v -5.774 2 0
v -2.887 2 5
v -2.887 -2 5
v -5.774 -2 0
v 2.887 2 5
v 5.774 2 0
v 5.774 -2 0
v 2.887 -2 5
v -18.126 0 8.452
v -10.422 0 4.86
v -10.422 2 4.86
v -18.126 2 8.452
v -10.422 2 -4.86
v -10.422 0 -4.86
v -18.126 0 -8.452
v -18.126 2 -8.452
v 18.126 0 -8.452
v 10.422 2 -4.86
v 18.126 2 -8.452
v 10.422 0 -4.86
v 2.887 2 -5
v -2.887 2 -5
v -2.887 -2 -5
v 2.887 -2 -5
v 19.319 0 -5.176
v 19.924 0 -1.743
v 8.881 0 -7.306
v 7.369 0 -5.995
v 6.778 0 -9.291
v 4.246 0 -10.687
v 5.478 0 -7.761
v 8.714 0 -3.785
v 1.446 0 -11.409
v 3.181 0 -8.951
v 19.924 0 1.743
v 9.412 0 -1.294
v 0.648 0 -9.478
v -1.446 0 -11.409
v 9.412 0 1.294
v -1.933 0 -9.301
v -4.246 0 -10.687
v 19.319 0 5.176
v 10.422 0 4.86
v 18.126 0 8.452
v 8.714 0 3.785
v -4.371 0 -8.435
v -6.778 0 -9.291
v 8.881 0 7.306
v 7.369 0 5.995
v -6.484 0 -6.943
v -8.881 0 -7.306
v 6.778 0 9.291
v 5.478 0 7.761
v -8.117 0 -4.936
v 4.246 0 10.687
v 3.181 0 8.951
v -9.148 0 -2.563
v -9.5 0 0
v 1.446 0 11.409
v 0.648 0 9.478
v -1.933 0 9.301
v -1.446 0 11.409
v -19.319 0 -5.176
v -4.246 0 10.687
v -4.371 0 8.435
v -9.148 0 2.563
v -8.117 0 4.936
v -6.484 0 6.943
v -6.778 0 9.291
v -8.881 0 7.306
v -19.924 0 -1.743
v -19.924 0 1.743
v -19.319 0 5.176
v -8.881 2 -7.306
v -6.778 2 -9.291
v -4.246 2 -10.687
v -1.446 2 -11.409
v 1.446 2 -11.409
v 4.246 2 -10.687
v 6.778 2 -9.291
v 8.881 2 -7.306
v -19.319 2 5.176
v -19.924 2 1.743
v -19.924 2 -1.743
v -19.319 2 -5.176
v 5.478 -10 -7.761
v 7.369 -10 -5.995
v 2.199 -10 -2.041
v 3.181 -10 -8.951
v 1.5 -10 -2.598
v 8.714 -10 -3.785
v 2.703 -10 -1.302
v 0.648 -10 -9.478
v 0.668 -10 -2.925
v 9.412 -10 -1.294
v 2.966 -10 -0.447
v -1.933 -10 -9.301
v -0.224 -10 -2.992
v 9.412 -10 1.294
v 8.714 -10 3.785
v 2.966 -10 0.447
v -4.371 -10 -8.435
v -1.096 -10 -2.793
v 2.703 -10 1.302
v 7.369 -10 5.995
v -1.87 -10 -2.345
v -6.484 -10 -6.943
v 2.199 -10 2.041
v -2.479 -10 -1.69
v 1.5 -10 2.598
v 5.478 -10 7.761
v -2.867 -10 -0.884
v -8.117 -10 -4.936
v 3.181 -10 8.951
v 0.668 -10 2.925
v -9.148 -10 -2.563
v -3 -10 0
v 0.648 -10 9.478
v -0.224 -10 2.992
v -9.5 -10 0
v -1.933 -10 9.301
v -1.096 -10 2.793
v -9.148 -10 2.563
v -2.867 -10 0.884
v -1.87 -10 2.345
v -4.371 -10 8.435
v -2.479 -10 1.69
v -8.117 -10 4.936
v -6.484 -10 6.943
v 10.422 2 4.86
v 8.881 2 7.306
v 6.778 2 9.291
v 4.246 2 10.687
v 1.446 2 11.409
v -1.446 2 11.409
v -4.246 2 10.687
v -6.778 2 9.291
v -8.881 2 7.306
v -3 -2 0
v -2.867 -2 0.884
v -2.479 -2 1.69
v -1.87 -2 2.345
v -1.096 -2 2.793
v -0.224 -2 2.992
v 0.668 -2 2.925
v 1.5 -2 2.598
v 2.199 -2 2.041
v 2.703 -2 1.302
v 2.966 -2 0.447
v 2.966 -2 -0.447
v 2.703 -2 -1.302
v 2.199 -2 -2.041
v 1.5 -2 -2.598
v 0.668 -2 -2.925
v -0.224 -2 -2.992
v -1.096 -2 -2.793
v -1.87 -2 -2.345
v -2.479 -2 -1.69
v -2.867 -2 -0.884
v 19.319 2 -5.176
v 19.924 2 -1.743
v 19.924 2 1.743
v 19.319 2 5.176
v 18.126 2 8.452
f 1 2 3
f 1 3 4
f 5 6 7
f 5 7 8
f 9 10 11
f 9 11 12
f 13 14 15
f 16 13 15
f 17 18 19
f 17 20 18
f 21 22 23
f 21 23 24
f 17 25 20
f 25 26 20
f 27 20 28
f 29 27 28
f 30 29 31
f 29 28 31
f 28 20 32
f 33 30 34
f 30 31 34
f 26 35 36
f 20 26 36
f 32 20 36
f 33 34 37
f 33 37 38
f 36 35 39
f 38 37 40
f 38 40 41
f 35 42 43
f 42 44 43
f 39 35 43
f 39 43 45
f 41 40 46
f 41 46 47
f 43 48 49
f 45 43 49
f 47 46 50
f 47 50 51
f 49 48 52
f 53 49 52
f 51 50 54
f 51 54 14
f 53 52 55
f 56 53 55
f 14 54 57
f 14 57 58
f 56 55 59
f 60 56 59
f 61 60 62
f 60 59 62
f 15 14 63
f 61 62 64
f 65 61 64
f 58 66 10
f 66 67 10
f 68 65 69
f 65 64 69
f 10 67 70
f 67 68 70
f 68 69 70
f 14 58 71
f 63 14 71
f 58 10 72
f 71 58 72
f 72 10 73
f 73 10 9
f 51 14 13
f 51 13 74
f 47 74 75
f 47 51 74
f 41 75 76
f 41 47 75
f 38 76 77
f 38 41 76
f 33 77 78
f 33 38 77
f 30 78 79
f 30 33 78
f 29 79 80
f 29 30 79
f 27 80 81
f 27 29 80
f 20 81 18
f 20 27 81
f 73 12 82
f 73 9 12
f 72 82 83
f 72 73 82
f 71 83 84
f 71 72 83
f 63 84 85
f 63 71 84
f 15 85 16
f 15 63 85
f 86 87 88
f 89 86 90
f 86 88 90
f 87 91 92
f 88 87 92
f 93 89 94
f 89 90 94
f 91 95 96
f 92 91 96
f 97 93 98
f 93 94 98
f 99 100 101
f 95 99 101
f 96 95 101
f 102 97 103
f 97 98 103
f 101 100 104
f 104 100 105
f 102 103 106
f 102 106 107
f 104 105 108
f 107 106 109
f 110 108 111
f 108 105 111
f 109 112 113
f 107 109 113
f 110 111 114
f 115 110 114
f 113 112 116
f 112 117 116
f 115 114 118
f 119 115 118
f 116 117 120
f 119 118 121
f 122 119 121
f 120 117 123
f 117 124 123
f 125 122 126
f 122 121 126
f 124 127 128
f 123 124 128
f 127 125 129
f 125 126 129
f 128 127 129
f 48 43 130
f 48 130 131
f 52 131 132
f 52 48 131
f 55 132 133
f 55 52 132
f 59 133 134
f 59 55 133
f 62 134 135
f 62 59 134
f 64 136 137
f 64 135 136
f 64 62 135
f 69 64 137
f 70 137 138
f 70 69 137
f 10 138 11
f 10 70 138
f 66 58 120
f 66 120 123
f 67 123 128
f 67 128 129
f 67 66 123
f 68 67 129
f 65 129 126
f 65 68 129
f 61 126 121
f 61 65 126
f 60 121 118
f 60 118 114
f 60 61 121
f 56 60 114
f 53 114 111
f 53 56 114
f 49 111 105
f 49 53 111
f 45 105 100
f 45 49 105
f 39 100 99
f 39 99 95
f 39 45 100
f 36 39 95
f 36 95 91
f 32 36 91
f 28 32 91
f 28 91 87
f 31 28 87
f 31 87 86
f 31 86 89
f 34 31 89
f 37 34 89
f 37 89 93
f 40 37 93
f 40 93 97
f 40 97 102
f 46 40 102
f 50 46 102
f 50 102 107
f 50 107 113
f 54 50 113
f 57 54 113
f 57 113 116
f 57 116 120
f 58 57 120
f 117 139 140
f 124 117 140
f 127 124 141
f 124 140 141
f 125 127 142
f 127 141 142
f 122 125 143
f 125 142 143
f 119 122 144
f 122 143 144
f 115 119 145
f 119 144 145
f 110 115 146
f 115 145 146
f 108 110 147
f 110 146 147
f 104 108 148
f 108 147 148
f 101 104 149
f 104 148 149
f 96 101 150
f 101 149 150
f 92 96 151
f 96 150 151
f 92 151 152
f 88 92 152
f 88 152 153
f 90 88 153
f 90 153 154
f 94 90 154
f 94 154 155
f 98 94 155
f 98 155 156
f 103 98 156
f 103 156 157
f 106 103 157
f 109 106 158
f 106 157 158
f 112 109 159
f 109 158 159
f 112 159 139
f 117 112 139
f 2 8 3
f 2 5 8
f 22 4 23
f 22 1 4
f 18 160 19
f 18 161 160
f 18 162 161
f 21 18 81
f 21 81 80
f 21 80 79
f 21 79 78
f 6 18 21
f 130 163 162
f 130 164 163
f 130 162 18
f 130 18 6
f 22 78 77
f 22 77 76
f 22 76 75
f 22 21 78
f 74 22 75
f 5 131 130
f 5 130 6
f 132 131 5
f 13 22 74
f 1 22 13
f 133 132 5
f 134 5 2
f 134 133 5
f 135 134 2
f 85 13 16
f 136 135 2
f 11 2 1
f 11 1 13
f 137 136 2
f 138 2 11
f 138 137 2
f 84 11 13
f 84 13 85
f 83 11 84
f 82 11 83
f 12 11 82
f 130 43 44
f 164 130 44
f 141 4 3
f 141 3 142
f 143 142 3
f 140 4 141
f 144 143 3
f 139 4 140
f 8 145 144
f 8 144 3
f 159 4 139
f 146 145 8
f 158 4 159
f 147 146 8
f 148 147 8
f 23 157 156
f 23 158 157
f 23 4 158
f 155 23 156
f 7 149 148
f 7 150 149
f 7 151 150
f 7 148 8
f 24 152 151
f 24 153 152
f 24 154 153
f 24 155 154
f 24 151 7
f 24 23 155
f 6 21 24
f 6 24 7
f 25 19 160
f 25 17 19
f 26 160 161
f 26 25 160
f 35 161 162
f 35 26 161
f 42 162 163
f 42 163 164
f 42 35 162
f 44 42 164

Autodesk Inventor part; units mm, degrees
ref_plane "YZ Plane" through (0, 0, 0) normal (1, 0, 0) x (0, 1, 0)
ref_plane "XZ Plane" through (0, 0, 0) normal (0, 1, 0) x (-1, 0, 0)
ref_plane "XY Plane" through (0, 0, 0) normal (0, 0, 1) x (1, 0, 0)
sketch "Skizze1" plane through (0, 0, 0) normal (0, 1, 0) x (-1, 0, 0)
  circle A0 centre (0, 0) radius 9.5
  circle A1 centre (0, 0) radius 11.5
  circle A2 centre (0, 0) radius 8.5
  circle A3 centre (0, 0) radius 3
  circle A4 centre (0, 0) radius 20
  line L0 (10.4225, 4.8601) -> (18.1262, 8.4524)
  line L1 (10.4225, -4.8601) -> (18.1262, -8.4524)
  line L2 (28, 0) -> (-28, 0) projected
  line L3 (-10.4225, 4.8601) -> (-18.1262, 8.4524)
  line L4 (-10.4225, -4.8601) -> (-18.1262, -8.4524)
  dimension "d0" = 19
  dimension "d1" = 23
  dimension "d2" = 17
  dimension "d3" = 6
  dimension "d8" = 40
  dimension "d10" = 50
extrude "Extrusion1" add sketch "Skizze1" along normal blind 2 contours L2 A2 A0 | L2 A1 A0 | A0 L2 A1 | A0 L2 A2 | L2 A4 L1 A1 | A1 L0 A4 L2 | L2 A3 A2 | A2 L2 A3 | L2 A4 L3 A1 | A1 L4 A4 L2
extrude "Extrusion2" add sketch "Skizze1" against normal blind 10 contours L2 A2 A0 | A0 L2 A2 | L2 A3 A2 | A2 L2 A3
sketch "Skizze2" plane through (0, 2, 0) normal (0, 1, 0) x (1, 0, 0)
  circle A0 centre (0, 0) radius 3 projected
  arc A1 (-18.1262, 8.4524) -> (-18.1262, -8.4524) centre (0, 0) ccw projected
  line L0 (-2.8868, 5) -> (2.8868, 5)
  line L1 (2.8868, 5) -> (5.7735, 0)
  line L2 (5.7735, 0) -> (2.8868, -5)
  line L3 (2.8868, -5) -> (-2.8868, -5)
  line L4 (-2.8868, -5) -> (-5.7735, 0)
  line L5 (-5.7735, 0) -> (-2.8868, 5)
  dimension "d11" = 10
extrude "Extrusion3" cut sketch "Skizze2" against normal blind 4
properties part number "Unterdruckventil_Gegenhalter"
